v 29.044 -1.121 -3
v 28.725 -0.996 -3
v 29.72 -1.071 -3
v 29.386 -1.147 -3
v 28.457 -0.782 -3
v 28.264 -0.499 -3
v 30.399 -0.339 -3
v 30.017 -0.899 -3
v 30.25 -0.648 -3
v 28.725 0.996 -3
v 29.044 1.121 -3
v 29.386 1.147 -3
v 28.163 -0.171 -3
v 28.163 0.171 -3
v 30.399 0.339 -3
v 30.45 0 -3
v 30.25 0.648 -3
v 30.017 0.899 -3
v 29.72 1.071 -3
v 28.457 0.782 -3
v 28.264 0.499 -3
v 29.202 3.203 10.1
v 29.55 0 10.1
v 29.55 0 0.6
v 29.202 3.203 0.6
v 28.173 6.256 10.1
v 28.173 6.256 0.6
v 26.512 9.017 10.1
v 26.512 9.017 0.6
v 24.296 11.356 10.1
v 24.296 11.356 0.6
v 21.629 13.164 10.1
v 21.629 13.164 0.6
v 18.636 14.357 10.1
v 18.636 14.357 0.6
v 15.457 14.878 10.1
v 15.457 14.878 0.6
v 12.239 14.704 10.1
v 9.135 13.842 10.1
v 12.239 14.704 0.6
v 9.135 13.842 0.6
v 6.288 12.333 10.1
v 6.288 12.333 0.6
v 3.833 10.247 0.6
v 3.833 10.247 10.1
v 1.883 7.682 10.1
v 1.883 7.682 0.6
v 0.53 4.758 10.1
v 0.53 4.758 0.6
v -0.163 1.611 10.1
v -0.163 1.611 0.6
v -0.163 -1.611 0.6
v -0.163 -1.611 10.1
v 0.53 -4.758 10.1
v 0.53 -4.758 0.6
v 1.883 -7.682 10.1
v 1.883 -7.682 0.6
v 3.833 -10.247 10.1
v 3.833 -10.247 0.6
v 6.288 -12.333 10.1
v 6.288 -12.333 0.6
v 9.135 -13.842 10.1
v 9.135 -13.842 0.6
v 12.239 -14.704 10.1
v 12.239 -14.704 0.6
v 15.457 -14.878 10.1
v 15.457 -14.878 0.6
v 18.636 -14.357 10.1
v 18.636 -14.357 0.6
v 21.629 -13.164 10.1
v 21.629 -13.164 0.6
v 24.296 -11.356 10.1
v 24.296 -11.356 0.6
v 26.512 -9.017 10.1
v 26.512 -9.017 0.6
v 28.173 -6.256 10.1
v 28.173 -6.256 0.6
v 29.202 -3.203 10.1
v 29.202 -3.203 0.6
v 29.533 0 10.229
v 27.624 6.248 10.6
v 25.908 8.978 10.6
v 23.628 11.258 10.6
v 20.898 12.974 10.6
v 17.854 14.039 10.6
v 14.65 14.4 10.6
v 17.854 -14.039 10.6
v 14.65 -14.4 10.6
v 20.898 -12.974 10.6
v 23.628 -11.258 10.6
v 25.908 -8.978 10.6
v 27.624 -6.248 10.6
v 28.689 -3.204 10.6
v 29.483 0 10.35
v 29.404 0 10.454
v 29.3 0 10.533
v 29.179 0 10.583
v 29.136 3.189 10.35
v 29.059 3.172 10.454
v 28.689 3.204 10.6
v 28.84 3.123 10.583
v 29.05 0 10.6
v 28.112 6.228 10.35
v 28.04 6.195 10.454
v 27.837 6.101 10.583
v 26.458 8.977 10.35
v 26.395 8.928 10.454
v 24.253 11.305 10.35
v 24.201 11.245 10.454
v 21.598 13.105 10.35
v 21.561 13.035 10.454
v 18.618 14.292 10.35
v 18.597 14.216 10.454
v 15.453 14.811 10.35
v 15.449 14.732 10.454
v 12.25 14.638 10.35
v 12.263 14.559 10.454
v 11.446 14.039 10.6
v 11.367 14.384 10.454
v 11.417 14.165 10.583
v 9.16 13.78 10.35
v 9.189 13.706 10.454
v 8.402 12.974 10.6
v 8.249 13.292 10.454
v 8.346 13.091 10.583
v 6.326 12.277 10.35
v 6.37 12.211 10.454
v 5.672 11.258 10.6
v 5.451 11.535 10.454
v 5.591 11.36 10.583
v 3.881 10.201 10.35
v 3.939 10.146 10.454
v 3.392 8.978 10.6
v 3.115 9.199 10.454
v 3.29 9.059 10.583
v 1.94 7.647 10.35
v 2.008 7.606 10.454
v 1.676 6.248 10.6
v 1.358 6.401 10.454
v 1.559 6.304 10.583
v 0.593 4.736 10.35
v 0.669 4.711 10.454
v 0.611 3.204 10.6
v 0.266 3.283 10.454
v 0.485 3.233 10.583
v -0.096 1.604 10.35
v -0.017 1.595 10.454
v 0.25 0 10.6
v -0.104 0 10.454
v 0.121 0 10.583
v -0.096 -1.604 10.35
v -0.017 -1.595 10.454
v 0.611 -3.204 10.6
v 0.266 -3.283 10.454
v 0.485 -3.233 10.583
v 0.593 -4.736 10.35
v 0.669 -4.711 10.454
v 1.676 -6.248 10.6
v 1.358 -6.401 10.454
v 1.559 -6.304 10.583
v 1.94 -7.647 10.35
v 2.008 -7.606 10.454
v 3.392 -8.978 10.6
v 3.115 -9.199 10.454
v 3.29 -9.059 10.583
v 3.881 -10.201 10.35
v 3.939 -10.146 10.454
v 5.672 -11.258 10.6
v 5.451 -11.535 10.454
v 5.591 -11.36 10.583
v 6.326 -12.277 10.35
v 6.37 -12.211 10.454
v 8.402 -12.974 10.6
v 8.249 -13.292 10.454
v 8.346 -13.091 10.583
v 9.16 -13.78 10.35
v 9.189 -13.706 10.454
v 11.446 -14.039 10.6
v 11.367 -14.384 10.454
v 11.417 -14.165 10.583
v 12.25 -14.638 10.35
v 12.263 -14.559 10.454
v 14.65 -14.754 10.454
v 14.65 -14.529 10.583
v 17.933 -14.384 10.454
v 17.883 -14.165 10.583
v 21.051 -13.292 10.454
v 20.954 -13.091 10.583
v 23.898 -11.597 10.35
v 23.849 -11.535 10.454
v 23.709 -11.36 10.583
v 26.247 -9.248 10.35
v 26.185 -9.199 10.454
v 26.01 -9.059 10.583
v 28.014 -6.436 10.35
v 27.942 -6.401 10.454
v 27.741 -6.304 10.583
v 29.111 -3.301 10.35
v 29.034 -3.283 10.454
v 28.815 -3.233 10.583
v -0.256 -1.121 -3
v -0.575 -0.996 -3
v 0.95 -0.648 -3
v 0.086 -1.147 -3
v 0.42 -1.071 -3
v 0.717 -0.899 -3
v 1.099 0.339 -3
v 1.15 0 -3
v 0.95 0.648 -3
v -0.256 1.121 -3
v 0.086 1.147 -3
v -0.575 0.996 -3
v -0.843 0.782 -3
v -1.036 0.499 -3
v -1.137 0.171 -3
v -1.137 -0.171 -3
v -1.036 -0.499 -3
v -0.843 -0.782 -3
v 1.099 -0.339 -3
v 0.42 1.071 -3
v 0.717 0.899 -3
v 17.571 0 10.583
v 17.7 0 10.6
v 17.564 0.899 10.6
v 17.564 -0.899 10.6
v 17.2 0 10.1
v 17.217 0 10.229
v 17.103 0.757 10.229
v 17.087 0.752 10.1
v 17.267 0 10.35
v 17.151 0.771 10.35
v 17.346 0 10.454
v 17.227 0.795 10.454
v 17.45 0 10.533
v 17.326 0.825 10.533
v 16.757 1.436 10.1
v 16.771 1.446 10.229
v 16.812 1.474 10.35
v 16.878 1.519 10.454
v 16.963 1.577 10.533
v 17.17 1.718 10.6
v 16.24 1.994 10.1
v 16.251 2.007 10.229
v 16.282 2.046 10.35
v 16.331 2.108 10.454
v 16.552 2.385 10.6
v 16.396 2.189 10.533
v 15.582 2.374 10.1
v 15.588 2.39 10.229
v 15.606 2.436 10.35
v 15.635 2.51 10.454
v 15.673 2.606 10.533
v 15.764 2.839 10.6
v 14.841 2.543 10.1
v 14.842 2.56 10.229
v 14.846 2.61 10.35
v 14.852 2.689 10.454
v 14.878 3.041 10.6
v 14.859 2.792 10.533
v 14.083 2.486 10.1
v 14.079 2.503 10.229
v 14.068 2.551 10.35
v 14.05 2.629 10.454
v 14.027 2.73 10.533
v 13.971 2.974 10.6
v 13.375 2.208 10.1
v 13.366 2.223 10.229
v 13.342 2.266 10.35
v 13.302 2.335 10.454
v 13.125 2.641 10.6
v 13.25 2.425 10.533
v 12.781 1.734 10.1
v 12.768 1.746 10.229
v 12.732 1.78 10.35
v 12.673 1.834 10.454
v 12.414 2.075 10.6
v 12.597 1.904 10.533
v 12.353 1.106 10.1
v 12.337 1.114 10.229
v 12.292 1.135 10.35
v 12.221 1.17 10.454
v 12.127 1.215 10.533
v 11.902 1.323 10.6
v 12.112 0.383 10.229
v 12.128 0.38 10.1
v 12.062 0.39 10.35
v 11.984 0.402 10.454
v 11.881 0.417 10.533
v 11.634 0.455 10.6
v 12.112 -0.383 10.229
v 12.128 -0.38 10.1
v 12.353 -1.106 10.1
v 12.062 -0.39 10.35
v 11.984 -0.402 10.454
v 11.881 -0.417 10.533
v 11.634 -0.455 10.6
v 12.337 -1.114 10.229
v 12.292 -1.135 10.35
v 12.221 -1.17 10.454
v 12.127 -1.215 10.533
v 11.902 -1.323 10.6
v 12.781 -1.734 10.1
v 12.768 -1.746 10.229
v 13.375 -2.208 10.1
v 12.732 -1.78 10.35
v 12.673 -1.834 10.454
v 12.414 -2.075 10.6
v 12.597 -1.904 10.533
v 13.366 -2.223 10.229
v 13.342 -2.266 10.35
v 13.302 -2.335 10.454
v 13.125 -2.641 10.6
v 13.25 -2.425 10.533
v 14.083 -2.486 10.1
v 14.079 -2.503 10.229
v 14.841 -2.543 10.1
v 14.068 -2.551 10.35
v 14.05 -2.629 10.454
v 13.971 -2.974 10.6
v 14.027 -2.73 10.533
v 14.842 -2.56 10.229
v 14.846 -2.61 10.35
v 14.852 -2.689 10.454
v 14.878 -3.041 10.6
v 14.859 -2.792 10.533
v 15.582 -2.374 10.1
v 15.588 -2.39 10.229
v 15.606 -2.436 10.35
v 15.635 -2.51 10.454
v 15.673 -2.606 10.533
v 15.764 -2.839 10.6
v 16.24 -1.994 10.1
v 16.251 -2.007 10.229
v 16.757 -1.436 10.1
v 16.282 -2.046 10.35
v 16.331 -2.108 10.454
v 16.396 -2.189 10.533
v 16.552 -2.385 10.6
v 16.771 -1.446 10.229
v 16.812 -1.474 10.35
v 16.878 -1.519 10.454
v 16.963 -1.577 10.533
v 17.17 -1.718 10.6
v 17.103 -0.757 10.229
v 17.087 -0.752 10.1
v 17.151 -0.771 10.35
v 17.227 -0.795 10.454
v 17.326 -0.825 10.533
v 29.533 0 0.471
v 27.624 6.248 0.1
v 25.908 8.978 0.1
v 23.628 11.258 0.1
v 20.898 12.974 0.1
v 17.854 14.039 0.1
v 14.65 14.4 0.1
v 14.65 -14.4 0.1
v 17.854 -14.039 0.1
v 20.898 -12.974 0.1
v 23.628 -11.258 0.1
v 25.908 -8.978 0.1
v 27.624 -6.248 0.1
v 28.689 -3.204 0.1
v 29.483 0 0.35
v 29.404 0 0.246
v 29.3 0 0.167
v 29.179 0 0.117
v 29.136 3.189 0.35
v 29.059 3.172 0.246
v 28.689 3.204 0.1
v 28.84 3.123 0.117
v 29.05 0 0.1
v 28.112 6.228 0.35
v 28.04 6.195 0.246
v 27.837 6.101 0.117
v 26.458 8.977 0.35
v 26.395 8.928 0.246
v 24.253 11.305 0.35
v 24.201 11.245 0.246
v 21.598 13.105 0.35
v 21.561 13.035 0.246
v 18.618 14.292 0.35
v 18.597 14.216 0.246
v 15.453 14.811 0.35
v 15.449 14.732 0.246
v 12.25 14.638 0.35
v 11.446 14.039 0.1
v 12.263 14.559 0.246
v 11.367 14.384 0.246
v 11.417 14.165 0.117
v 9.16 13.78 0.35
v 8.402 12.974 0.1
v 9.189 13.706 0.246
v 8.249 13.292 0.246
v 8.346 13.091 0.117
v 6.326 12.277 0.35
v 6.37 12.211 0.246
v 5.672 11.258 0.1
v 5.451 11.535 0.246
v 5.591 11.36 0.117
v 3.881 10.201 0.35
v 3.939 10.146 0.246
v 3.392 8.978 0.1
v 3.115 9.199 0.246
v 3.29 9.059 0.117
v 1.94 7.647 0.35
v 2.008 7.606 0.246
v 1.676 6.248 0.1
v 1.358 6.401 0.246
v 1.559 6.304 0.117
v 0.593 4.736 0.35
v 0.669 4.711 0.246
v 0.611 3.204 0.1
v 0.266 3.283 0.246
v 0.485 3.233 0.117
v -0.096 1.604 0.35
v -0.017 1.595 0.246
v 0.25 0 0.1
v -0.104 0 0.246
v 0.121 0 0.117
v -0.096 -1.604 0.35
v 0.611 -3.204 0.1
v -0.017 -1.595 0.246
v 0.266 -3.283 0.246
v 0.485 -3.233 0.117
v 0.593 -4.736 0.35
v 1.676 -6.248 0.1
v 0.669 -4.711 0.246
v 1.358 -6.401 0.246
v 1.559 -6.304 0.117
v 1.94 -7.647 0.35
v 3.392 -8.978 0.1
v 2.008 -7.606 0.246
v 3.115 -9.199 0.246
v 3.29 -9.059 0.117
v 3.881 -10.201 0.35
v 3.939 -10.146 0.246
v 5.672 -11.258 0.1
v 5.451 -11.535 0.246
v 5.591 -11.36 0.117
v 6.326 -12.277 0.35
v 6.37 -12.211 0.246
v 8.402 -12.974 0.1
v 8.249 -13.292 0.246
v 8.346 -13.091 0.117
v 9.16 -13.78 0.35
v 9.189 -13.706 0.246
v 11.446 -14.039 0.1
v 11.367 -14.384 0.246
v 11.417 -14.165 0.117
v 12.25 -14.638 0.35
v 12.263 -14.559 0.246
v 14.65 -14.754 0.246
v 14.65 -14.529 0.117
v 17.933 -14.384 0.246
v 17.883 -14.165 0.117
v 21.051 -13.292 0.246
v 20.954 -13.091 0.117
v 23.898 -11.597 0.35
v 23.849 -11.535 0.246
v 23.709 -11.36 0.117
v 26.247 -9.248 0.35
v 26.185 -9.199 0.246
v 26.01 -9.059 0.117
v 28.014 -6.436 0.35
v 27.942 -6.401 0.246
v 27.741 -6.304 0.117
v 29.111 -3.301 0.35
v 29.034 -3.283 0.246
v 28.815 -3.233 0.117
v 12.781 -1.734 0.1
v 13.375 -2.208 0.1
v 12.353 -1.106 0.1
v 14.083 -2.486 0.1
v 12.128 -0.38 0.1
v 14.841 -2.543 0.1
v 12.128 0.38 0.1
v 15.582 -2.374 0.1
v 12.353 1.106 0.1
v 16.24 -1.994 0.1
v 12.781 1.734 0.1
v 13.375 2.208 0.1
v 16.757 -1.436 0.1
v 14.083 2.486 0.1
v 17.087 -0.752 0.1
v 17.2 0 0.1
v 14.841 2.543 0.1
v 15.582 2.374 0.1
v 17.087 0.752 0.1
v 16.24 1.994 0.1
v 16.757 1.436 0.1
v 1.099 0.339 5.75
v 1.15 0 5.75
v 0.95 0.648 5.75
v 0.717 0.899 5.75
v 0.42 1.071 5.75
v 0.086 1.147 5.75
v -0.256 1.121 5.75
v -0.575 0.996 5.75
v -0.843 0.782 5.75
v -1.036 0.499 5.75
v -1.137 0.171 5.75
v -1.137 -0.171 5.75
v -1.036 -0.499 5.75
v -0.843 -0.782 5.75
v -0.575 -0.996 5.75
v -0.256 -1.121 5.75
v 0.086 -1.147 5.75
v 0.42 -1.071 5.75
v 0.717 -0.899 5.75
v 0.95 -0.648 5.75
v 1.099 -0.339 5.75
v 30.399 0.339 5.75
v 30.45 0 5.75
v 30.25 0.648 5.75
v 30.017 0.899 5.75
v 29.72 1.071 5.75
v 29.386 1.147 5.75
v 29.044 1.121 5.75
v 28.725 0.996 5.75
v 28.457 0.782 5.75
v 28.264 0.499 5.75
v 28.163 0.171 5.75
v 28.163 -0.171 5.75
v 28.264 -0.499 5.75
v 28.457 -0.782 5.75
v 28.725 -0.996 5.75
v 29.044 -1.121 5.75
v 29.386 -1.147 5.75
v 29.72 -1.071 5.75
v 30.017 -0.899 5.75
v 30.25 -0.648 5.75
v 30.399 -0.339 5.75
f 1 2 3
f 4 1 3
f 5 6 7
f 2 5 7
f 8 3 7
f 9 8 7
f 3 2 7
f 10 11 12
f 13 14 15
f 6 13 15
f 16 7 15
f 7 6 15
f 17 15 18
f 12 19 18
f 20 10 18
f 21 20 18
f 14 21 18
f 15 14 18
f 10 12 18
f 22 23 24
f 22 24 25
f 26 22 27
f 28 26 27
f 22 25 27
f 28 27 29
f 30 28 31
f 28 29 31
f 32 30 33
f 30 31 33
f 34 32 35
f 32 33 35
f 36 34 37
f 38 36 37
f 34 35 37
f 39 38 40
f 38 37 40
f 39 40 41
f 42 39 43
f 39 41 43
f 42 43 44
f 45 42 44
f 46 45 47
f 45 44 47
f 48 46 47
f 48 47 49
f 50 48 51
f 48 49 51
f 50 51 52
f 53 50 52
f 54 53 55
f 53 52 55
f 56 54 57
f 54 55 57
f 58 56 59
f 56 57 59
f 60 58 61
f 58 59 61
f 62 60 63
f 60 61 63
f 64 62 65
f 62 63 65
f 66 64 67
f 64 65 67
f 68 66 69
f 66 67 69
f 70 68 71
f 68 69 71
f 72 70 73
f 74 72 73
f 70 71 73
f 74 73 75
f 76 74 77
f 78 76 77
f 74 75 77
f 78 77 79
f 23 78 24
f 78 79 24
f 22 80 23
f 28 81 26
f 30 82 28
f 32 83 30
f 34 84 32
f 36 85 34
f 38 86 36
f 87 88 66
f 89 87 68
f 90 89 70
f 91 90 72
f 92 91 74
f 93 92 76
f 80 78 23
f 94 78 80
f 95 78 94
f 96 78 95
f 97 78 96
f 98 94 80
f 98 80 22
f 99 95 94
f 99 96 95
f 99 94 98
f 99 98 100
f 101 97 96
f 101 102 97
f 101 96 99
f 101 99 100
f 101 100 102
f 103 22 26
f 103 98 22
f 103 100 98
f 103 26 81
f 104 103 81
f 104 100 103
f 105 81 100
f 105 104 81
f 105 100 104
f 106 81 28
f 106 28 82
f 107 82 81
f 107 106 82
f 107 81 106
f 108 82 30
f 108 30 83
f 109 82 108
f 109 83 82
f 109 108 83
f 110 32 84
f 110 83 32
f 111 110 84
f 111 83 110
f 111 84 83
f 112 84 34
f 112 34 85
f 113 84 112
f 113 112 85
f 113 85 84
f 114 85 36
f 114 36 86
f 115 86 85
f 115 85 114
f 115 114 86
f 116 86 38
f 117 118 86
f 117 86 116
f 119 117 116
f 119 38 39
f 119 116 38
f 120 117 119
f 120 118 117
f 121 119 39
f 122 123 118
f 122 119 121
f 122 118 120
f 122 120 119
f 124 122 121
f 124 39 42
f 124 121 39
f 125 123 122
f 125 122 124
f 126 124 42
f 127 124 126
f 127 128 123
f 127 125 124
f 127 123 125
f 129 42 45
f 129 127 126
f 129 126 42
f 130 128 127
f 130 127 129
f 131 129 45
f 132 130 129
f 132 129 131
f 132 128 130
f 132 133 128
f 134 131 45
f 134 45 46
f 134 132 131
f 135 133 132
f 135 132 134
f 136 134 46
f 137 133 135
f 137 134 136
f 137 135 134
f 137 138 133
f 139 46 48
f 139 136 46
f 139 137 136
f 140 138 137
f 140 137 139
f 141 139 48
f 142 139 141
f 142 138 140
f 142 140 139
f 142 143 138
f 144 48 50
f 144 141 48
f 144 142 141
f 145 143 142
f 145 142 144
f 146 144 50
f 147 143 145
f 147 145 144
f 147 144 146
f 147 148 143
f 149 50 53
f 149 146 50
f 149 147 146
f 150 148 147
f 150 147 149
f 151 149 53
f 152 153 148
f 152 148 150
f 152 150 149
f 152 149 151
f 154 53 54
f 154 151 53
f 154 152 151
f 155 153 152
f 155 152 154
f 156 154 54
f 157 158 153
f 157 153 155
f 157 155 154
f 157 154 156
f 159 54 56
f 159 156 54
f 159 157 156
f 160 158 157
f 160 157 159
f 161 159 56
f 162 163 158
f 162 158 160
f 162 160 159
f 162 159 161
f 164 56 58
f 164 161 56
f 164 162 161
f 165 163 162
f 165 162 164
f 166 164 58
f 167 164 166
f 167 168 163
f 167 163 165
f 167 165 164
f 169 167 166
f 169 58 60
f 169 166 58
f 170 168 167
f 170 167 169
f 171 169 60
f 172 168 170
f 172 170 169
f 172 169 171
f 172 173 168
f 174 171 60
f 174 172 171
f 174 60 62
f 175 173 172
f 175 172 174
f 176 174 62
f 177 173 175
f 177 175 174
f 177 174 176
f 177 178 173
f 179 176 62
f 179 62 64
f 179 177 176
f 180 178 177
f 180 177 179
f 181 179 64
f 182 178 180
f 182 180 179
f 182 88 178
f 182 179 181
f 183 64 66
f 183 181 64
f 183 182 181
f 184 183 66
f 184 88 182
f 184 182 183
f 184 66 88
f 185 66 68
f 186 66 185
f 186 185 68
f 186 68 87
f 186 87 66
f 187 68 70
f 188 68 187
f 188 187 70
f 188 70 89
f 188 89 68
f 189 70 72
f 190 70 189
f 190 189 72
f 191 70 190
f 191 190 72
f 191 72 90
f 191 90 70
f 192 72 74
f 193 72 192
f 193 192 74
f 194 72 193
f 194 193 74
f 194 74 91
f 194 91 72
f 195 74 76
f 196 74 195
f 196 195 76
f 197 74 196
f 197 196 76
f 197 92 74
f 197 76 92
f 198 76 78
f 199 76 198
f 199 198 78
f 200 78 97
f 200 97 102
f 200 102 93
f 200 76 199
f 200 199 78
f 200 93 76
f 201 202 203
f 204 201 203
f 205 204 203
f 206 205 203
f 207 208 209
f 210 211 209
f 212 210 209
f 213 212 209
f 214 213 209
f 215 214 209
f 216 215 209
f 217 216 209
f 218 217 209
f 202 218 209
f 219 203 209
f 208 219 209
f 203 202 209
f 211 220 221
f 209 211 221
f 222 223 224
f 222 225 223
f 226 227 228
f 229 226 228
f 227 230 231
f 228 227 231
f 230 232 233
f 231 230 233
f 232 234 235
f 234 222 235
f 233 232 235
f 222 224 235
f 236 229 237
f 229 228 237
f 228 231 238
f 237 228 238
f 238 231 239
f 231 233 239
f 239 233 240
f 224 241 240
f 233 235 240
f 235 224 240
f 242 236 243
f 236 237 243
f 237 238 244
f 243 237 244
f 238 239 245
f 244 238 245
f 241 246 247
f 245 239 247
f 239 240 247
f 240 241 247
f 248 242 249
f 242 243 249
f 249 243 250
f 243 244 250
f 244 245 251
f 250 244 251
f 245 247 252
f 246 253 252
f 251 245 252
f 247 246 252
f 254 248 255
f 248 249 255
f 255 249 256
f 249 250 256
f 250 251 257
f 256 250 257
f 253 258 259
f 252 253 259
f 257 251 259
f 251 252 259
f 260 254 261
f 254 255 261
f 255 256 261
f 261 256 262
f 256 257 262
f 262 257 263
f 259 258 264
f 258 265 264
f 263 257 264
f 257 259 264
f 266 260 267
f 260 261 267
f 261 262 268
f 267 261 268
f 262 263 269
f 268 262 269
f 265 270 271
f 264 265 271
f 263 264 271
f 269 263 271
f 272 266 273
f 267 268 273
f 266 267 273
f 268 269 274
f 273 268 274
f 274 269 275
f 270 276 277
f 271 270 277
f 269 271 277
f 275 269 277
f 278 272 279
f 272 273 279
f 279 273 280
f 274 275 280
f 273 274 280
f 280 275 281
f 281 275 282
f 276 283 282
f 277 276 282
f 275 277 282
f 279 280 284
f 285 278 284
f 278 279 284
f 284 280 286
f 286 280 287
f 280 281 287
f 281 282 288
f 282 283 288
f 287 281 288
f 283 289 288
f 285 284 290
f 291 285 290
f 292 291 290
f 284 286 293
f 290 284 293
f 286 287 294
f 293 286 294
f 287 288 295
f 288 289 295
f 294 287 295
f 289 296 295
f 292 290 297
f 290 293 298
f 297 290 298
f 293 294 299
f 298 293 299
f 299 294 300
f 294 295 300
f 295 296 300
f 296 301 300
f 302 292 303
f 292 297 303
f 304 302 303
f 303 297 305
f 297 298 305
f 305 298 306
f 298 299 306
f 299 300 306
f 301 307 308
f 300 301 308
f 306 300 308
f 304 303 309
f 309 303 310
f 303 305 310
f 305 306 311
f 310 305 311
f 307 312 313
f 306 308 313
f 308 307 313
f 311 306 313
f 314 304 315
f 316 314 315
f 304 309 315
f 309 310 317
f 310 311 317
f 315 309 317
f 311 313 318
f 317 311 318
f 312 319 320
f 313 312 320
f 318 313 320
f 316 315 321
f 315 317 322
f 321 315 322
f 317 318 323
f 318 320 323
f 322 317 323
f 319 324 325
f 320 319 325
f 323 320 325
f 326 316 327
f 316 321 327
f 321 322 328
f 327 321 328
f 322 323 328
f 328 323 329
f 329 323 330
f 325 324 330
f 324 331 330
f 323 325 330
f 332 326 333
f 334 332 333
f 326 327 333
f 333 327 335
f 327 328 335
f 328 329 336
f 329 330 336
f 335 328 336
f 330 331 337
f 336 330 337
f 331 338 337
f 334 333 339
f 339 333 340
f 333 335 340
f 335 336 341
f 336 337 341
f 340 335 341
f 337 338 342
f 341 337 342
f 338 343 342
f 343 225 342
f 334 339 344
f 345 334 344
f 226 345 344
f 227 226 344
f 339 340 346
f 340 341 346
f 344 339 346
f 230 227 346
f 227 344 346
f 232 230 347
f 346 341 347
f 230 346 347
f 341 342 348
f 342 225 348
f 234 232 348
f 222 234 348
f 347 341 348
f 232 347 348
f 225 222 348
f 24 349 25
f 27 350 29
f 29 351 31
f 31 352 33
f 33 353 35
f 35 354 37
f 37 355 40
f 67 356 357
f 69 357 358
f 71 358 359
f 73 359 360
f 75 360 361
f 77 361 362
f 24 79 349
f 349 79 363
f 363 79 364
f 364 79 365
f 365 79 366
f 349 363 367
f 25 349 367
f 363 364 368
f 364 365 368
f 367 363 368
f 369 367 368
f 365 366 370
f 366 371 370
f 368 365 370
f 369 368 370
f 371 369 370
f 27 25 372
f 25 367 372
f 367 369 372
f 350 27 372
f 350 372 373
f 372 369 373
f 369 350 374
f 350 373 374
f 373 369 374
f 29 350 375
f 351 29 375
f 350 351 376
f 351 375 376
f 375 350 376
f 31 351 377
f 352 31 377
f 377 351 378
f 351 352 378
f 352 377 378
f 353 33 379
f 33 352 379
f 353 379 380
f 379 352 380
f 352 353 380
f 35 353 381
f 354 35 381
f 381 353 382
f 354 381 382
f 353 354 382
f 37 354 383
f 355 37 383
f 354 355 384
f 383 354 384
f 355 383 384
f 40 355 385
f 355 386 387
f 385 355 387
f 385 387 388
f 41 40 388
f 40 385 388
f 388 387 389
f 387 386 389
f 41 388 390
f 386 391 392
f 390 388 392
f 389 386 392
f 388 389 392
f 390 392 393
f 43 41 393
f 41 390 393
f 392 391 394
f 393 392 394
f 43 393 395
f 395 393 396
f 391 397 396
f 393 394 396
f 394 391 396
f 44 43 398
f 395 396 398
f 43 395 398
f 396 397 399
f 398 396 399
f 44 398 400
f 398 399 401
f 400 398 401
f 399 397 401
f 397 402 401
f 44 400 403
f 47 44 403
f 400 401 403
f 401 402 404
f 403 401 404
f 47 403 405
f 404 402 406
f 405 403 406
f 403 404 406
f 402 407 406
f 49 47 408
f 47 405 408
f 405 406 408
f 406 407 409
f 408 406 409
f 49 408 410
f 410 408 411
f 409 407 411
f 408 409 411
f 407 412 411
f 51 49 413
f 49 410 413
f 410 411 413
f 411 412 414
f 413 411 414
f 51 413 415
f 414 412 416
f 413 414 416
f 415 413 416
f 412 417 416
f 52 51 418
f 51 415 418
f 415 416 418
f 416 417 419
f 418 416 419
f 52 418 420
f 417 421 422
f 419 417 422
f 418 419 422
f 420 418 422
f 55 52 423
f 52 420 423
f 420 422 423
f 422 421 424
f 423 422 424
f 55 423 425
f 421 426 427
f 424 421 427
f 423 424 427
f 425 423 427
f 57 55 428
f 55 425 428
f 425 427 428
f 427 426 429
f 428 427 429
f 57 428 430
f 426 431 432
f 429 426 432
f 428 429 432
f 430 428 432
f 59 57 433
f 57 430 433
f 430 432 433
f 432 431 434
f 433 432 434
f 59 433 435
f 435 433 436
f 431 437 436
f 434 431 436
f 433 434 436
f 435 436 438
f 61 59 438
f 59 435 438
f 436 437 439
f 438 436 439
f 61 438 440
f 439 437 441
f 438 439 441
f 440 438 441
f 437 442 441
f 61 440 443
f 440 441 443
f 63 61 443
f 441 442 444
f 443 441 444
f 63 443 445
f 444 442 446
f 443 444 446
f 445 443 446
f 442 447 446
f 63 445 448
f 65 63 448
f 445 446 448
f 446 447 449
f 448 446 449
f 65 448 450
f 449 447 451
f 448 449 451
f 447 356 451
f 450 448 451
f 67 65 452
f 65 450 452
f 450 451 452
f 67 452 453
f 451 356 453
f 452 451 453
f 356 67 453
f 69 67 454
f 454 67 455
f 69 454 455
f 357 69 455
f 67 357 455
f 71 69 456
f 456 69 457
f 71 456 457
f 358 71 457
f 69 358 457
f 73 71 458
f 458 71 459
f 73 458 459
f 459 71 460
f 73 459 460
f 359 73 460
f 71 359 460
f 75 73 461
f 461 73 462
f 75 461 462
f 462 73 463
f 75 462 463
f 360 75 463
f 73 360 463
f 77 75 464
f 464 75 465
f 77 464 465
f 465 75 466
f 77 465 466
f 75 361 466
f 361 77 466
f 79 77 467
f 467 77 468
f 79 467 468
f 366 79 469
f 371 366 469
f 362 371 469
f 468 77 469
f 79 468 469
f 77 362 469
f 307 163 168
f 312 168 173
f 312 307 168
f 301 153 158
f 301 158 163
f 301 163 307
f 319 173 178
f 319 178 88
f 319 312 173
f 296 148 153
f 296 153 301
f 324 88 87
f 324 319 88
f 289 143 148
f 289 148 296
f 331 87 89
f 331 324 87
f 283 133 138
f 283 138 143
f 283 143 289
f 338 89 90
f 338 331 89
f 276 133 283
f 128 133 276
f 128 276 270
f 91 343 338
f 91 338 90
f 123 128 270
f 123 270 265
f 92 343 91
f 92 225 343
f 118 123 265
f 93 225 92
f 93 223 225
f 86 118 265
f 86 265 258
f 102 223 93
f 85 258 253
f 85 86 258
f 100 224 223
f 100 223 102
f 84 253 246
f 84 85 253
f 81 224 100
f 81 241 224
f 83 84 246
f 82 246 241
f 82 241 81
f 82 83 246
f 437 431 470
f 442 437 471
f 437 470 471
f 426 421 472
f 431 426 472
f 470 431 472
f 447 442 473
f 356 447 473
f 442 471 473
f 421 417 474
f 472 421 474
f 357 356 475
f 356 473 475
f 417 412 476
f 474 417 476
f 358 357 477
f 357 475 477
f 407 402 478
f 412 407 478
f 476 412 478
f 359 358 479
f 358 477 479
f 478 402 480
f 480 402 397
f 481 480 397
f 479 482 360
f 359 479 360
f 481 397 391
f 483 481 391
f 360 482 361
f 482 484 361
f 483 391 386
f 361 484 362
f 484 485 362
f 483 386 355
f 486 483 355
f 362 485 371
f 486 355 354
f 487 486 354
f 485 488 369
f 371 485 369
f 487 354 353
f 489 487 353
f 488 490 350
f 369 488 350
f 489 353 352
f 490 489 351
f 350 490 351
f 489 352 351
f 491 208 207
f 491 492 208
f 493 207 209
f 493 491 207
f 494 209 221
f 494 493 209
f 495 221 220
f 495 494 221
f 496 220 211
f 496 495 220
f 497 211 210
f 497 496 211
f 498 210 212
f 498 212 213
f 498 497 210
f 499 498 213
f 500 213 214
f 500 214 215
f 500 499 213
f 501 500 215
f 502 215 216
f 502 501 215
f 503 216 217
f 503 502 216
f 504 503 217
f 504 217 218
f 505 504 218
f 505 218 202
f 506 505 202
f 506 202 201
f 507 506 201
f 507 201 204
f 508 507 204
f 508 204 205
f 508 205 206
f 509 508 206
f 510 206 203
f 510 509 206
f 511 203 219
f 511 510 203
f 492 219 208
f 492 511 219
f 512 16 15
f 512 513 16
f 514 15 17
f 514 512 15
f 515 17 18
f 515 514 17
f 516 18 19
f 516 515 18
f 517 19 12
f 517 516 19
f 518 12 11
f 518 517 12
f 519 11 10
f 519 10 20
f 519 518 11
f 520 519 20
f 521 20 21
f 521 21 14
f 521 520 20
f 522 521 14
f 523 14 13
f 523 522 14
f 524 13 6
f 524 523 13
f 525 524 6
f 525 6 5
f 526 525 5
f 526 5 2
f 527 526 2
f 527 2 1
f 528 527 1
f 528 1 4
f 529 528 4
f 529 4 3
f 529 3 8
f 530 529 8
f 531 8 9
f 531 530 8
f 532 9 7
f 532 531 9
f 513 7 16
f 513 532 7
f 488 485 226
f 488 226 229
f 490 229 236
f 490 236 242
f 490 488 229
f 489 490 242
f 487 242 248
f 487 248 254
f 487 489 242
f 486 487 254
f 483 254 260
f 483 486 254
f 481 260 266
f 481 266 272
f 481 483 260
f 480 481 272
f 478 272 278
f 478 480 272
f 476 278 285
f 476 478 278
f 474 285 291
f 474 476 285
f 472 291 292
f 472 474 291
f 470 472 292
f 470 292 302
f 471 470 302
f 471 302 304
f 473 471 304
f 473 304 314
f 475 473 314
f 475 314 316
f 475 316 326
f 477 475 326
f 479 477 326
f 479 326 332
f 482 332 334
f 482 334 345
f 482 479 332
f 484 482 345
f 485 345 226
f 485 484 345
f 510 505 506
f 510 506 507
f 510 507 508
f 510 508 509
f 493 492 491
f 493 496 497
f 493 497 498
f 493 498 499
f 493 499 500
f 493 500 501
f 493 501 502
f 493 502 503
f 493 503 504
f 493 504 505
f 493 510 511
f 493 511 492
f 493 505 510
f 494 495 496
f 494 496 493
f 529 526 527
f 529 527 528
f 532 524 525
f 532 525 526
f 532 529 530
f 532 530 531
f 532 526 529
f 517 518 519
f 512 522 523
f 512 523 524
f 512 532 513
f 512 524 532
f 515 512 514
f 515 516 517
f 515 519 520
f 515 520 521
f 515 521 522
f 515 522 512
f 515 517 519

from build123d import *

# Parameters (mm, degrees)
SKETCH001_R       = 1.15
PAD001_DEPTH      = 5.25
PAD001_DEPTH_BACK = 3.5
SKETCH_R          = 14.9
SKETCH_R_2        = 2.55
PAD_DEPTH         = 10.5
FILLET_R          = 0.5


with BuildPart() as pad001:
    # Sketch001 → Pad001 (new body, two sides)
    with BuildSketch(Plane.XY.offset(0.5)) as pad001_sk:
        Circle(SKETCH001_R)
        with Locations((29.3, 0)):
            Circle(SKETCH001_R)
    extrude(amount=PAD001_DEPTH)
    extrude(pad001_sk.sketch, amount=-PAD001_DEPTH_BACK)


with BuildPart() as fillet_body:
    # Sketch → Pad (new body)
    with BuildSketch(Plane.XY.offset(0.1)):
        with Locations((14.65, 0)):
            Circle(SKETCH_R)
        with Locations((14.65, 0)):
            Circle(SKETCH_R_2, mode=Mode.SUBTRACT)
    extrude(amount=PAD_DEPTH)

    # Fillet
    fillet_edges = [fillet_body.edges().sort_by_distance(p)[0] for p in [
        (12.1, 0, 10.6),
        (-0.25, 0, 10.6),
        (-0.25, 0, 0.1),
    ]]
    fillet(fillet_edges, radius=FILLET_R)


solid = Compound([pad001.part, fillet_body.part])
